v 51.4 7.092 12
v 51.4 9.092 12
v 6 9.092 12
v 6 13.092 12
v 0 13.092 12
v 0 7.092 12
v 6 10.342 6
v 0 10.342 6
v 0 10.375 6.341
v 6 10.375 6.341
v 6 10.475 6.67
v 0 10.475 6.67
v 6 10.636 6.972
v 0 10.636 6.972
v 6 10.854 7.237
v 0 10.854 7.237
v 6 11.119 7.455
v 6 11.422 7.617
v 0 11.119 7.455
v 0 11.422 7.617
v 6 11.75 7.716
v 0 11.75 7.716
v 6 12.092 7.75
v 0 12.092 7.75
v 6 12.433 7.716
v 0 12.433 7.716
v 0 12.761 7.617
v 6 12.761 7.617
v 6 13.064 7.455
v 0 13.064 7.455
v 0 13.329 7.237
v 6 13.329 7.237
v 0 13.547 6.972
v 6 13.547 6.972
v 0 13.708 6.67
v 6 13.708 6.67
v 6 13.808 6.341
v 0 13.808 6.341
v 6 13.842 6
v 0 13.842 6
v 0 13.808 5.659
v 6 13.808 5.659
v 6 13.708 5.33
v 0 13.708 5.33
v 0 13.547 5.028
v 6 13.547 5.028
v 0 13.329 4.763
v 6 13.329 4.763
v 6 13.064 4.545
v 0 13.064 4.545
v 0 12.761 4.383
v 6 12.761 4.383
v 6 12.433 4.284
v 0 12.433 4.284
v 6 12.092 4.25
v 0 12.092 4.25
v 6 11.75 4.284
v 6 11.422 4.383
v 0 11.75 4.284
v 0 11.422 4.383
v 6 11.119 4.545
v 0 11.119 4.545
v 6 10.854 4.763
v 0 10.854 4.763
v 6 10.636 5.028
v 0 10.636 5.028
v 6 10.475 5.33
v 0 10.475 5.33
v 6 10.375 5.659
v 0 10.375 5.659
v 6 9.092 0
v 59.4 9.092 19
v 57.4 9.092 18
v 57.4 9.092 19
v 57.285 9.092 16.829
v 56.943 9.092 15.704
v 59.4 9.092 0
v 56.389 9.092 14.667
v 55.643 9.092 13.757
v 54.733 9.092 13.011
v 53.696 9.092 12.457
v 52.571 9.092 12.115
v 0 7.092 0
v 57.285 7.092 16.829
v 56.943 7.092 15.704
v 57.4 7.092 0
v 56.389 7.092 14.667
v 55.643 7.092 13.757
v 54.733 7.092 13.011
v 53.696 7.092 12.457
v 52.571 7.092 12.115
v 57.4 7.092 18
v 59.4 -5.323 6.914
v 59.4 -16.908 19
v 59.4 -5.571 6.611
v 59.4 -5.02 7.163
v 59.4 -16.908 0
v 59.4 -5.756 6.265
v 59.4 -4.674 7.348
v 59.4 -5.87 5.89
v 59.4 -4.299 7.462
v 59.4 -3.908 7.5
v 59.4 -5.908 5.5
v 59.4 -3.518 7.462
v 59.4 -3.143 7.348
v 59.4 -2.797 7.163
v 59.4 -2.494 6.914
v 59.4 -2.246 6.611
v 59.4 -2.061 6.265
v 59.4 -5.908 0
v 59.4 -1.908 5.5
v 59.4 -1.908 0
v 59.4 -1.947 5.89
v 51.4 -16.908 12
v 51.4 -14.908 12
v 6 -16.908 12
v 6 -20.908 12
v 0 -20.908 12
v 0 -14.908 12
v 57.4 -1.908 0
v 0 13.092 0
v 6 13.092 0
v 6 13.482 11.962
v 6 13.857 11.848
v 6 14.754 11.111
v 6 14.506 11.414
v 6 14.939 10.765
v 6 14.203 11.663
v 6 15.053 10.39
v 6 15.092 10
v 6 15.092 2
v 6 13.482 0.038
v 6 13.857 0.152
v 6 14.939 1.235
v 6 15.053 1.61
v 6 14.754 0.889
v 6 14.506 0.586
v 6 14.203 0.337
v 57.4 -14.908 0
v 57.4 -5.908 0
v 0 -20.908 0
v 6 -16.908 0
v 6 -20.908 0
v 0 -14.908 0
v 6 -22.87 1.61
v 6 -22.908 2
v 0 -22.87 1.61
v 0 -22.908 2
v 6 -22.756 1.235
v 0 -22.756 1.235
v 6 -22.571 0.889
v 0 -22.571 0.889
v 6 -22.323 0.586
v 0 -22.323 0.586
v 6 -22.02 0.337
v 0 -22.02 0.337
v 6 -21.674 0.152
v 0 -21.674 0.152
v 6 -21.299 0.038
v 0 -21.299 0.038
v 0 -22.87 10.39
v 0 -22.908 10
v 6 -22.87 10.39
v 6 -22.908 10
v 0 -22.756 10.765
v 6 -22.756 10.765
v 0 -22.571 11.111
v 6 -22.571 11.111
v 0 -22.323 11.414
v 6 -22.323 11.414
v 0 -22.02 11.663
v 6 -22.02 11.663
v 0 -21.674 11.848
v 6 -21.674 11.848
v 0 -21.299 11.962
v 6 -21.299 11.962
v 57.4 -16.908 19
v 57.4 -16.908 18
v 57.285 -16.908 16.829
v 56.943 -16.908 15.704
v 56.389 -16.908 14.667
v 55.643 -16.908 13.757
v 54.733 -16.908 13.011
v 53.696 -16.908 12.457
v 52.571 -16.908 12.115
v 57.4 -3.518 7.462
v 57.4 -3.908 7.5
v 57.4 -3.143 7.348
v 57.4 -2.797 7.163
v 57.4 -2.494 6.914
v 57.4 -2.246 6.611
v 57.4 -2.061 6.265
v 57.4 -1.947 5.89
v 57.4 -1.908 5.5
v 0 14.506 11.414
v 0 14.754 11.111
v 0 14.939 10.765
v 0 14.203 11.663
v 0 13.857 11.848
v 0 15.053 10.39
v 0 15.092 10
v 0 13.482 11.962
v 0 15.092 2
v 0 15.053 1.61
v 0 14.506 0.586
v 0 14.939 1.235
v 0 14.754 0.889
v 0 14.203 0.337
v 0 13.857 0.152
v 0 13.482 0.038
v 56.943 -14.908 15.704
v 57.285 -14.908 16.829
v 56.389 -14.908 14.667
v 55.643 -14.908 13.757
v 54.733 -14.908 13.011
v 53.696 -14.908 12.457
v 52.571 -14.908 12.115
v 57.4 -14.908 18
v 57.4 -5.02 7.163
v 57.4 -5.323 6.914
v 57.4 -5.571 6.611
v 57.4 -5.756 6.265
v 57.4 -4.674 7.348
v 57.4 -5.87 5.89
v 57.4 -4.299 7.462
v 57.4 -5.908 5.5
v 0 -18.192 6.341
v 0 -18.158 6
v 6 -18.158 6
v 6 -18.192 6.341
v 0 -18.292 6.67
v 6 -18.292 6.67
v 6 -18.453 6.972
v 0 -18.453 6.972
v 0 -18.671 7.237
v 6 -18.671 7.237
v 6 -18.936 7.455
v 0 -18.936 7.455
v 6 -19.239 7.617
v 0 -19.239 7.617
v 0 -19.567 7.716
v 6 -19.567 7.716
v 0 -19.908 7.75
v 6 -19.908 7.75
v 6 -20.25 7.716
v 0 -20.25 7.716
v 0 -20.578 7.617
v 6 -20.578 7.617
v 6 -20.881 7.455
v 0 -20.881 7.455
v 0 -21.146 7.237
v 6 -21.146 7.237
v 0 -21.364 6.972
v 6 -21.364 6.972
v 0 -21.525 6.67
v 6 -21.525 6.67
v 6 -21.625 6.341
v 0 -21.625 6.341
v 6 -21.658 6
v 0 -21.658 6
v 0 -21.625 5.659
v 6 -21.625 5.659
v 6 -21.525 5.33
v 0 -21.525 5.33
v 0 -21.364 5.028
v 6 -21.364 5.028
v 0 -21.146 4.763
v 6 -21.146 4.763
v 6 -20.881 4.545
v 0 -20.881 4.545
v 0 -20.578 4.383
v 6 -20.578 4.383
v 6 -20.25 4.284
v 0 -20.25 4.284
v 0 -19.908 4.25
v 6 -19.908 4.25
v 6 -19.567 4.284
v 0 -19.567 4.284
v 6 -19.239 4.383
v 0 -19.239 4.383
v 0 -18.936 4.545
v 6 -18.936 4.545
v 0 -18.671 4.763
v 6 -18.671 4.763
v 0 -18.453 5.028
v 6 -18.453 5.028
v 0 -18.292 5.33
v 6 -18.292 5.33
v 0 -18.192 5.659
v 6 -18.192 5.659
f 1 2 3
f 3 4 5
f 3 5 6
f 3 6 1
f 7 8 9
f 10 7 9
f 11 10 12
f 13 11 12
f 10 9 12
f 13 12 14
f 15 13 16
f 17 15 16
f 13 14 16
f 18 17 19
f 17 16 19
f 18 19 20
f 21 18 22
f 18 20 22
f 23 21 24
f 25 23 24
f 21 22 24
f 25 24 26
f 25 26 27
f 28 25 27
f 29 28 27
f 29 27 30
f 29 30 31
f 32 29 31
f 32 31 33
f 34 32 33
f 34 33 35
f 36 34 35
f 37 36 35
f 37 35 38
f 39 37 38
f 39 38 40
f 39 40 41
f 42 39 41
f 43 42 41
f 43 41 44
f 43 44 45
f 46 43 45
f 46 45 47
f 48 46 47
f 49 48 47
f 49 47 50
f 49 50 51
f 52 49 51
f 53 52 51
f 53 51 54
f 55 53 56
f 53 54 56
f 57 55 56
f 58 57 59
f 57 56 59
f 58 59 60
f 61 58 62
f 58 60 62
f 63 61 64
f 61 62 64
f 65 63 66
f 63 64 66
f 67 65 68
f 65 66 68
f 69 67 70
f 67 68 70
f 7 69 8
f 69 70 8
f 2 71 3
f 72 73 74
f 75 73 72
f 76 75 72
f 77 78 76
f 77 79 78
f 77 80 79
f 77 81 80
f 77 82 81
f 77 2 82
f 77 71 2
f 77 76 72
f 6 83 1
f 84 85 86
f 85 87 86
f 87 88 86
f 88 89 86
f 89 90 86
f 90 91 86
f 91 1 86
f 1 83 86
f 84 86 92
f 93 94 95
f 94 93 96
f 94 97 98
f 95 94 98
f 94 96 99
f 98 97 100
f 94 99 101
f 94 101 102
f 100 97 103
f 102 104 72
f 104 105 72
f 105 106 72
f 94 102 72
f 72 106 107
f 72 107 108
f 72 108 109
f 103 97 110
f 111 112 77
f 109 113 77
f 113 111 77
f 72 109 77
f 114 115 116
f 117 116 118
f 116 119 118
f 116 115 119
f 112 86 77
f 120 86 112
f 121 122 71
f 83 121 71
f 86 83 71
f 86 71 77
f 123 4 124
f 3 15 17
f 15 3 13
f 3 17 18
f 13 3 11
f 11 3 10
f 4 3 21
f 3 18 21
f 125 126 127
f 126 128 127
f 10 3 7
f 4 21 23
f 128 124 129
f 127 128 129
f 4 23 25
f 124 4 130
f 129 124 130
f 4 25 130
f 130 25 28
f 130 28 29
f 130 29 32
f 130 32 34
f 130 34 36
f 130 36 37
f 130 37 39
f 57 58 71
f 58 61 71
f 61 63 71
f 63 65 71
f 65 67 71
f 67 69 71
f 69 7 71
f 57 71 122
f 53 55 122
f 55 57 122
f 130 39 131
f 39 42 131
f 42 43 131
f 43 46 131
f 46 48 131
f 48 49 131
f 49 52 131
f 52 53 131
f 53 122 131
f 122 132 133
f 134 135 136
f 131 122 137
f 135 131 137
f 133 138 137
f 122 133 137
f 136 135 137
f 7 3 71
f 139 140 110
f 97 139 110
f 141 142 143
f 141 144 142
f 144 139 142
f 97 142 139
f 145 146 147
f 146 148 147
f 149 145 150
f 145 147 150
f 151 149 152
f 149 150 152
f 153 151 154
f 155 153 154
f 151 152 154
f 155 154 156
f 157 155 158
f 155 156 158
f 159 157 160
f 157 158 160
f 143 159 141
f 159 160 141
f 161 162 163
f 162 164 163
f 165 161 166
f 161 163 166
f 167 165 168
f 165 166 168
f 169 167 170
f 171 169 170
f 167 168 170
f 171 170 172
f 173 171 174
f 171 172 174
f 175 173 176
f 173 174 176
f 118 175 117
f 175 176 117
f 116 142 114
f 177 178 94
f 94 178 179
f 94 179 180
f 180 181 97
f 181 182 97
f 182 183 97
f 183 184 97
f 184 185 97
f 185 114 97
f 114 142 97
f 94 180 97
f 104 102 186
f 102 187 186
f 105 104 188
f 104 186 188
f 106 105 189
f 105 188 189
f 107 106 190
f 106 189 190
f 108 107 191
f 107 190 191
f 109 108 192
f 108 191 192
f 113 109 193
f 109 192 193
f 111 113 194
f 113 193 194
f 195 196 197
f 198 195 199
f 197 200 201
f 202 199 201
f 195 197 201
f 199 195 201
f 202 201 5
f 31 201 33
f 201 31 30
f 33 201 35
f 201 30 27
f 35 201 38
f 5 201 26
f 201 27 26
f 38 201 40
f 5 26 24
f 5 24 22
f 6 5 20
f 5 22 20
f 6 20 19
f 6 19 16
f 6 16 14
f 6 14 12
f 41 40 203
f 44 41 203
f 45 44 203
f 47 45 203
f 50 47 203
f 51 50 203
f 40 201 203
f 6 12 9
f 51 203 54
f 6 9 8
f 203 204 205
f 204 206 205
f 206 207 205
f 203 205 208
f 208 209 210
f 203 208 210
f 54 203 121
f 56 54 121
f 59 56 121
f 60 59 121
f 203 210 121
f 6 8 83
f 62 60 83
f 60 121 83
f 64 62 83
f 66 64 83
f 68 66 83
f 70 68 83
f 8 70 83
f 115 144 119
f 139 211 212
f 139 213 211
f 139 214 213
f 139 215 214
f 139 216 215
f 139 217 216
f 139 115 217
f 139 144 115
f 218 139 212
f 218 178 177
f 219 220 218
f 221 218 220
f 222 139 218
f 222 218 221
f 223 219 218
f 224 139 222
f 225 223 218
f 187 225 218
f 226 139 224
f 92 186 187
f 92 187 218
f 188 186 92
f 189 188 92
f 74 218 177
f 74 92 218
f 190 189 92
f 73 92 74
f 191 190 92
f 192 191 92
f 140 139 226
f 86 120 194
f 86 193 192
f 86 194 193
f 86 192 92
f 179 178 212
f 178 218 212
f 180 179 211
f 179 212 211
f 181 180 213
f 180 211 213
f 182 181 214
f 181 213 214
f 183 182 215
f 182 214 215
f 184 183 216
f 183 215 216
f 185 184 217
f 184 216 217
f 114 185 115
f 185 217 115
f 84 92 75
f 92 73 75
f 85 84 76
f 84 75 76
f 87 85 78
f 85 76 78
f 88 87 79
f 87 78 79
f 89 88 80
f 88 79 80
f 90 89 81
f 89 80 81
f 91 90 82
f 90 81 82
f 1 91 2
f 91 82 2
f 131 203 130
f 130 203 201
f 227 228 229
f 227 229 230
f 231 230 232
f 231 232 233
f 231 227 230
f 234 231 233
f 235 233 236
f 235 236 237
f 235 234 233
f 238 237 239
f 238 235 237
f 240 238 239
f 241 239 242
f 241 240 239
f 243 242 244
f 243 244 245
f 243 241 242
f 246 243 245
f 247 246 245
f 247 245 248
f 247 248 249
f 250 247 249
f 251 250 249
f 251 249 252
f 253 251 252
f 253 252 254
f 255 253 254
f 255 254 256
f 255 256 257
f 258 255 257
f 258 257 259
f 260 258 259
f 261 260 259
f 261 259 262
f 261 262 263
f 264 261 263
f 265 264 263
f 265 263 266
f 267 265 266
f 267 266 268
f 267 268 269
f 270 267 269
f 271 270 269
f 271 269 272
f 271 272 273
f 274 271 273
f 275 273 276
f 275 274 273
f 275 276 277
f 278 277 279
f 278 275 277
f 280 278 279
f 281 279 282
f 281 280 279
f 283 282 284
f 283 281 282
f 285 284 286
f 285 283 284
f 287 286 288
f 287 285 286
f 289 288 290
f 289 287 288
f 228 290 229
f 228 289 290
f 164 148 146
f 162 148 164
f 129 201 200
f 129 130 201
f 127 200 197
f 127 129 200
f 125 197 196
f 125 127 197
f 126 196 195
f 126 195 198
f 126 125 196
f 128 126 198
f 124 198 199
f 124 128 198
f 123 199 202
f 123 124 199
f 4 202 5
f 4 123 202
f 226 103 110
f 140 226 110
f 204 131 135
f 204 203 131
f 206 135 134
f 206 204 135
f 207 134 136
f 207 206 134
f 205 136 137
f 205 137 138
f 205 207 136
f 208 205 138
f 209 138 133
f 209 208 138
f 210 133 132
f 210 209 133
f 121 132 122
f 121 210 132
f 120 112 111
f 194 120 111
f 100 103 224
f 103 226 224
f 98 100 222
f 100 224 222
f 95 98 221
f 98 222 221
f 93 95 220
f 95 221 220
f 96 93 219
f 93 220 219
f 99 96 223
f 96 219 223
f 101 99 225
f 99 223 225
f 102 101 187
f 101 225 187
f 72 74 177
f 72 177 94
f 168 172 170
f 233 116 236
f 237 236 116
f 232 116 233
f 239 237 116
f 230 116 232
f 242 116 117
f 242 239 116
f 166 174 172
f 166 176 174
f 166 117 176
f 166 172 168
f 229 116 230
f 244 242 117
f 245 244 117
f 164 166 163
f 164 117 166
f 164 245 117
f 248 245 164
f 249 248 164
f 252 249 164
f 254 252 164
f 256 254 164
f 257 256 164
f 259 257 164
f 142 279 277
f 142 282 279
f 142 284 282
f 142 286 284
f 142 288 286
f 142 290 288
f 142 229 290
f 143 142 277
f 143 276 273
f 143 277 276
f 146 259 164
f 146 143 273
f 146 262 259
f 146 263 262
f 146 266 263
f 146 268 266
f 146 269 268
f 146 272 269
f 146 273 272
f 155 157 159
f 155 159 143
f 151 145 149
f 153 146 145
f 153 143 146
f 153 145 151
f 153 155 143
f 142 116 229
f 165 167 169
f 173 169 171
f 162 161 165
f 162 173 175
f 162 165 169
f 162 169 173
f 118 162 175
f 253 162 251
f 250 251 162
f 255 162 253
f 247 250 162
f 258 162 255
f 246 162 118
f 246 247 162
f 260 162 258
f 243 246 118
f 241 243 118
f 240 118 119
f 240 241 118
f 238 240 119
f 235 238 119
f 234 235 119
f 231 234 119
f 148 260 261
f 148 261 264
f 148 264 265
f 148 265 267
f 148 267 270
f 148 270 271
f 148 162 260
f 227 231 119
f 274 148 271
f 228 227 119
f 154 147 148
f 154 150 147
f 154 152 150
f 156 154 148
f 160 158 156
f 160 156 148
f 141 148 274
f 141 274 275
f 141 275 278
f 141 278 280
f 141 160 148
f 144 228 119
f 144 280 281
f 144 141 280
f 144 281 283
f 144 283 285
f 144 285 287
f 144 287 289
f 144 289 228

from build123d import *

# Parameters (mm, degrees)
F1_DEPTH  = 12
F3_DEPTH  = 4
F2_R      = 1.75
F4_DEPTH  = 25
F5_R      = 2
F8_DEPTH  = 25
F9_W      = 2
F9_H      = 26
F10_DEPTH = 7
F11_R     = 6
F12_R     = 1.99999


# Not quite as in the source:
# - a fillet or chamfer is up to 0.001 mm smaller than in the source, because OpenCascade refuses the exact size


with BuildPart() as f1:
    # F0 (on Top) → F1 (new body)
    with BuildSketch(Plane.XY):
        Polygon((2, 15.0915228184), (0, 15.0915228184), (0, 7.0915228184), (57.4, 7.0915228184), (57.4, -3.9084771816), (59.4, -3.9084771816), (59.4, 9.0915228184), (2, 9.0915228184), align=None)
    extrude(amount=F1_DEPTH)

    # F3 (add): a face of the model
    f3_faces = [f1.faces().sort_by_distance(p)[0] for p in [
        (2, 12.0915228184, 6),
    ]]
    extrude(f3_faces, amount=F3_DEPTH)

    # F2 (on face) → F4 (cut)
    with BuildSketch(Plane(origin=(0, 0, 0), x_dir=(0, -1, 0), z_dir=(-1, 0, 0))):
        with Locations((-12.0915228184, 6)):
            Circle(F2_R)
    extrude(amount=-F4_DEPTH, mode=Mode.SUBTRACT)

    # F5
    f5_edges = [f1.edges().sort_by_distance(p)[0] for p in [
        (3, 15.091523, 0),
        (3, 15.091523, 12),
    ]]
    fillet(f5_edges, radius=F5_R)

    # F6: F1 across face


with BuildPart() as f1_1:
    add(f1.part)
    add(f1.part.mirror(Plane(origin=(58.4, -3.9084771816, 6), x_dir=(1, 0, 0), z_dir=(0, -1, 0))))

    # F7 (on face) → F8 (cut)
    with BuildSketch(Plane.YZ.offset(59.4)):
        Polygon((-1.9084771816, 7.5), (-3.9084771816, 7.5), (-5.9084771816, 7.5), (-5.9084771816, 0), (-1.9084771816, 0), align=None)
    extrude(amount=-F8_DEPTH, mode=Mode.SUBTRACT)

    # F9 (on face) → F10 (join)
    with BuildSketch(Plane.XY.offset(12)):
        with Locations((58.4, -3.9084771816)):
            Rectangle(F9_W, F9_H)
    extrude(amount=F10_DEPTH)

    # F11
    f11_edges = [f1_1.edges().sort_by_distance(p)[0] for p in [
        (57.4, -15.908477, 12),
        (57.4, 8.091523, 12),
    ]]
    fillet(f11_edges, radius=F11_R)

    # F12 (radius 2 in the source; OpenCascade refuses exactly that, so slightly less here)
    f12_edges = [f1_1.edges().sort_by_distance(p)[0] for p in [
        (58.4, -1.908477, 7.5),
        (58.4, -5.908477, 7.5),
    ]]
    fillet(f12_edges, radius=F12_R)


solid = f1_1.part
